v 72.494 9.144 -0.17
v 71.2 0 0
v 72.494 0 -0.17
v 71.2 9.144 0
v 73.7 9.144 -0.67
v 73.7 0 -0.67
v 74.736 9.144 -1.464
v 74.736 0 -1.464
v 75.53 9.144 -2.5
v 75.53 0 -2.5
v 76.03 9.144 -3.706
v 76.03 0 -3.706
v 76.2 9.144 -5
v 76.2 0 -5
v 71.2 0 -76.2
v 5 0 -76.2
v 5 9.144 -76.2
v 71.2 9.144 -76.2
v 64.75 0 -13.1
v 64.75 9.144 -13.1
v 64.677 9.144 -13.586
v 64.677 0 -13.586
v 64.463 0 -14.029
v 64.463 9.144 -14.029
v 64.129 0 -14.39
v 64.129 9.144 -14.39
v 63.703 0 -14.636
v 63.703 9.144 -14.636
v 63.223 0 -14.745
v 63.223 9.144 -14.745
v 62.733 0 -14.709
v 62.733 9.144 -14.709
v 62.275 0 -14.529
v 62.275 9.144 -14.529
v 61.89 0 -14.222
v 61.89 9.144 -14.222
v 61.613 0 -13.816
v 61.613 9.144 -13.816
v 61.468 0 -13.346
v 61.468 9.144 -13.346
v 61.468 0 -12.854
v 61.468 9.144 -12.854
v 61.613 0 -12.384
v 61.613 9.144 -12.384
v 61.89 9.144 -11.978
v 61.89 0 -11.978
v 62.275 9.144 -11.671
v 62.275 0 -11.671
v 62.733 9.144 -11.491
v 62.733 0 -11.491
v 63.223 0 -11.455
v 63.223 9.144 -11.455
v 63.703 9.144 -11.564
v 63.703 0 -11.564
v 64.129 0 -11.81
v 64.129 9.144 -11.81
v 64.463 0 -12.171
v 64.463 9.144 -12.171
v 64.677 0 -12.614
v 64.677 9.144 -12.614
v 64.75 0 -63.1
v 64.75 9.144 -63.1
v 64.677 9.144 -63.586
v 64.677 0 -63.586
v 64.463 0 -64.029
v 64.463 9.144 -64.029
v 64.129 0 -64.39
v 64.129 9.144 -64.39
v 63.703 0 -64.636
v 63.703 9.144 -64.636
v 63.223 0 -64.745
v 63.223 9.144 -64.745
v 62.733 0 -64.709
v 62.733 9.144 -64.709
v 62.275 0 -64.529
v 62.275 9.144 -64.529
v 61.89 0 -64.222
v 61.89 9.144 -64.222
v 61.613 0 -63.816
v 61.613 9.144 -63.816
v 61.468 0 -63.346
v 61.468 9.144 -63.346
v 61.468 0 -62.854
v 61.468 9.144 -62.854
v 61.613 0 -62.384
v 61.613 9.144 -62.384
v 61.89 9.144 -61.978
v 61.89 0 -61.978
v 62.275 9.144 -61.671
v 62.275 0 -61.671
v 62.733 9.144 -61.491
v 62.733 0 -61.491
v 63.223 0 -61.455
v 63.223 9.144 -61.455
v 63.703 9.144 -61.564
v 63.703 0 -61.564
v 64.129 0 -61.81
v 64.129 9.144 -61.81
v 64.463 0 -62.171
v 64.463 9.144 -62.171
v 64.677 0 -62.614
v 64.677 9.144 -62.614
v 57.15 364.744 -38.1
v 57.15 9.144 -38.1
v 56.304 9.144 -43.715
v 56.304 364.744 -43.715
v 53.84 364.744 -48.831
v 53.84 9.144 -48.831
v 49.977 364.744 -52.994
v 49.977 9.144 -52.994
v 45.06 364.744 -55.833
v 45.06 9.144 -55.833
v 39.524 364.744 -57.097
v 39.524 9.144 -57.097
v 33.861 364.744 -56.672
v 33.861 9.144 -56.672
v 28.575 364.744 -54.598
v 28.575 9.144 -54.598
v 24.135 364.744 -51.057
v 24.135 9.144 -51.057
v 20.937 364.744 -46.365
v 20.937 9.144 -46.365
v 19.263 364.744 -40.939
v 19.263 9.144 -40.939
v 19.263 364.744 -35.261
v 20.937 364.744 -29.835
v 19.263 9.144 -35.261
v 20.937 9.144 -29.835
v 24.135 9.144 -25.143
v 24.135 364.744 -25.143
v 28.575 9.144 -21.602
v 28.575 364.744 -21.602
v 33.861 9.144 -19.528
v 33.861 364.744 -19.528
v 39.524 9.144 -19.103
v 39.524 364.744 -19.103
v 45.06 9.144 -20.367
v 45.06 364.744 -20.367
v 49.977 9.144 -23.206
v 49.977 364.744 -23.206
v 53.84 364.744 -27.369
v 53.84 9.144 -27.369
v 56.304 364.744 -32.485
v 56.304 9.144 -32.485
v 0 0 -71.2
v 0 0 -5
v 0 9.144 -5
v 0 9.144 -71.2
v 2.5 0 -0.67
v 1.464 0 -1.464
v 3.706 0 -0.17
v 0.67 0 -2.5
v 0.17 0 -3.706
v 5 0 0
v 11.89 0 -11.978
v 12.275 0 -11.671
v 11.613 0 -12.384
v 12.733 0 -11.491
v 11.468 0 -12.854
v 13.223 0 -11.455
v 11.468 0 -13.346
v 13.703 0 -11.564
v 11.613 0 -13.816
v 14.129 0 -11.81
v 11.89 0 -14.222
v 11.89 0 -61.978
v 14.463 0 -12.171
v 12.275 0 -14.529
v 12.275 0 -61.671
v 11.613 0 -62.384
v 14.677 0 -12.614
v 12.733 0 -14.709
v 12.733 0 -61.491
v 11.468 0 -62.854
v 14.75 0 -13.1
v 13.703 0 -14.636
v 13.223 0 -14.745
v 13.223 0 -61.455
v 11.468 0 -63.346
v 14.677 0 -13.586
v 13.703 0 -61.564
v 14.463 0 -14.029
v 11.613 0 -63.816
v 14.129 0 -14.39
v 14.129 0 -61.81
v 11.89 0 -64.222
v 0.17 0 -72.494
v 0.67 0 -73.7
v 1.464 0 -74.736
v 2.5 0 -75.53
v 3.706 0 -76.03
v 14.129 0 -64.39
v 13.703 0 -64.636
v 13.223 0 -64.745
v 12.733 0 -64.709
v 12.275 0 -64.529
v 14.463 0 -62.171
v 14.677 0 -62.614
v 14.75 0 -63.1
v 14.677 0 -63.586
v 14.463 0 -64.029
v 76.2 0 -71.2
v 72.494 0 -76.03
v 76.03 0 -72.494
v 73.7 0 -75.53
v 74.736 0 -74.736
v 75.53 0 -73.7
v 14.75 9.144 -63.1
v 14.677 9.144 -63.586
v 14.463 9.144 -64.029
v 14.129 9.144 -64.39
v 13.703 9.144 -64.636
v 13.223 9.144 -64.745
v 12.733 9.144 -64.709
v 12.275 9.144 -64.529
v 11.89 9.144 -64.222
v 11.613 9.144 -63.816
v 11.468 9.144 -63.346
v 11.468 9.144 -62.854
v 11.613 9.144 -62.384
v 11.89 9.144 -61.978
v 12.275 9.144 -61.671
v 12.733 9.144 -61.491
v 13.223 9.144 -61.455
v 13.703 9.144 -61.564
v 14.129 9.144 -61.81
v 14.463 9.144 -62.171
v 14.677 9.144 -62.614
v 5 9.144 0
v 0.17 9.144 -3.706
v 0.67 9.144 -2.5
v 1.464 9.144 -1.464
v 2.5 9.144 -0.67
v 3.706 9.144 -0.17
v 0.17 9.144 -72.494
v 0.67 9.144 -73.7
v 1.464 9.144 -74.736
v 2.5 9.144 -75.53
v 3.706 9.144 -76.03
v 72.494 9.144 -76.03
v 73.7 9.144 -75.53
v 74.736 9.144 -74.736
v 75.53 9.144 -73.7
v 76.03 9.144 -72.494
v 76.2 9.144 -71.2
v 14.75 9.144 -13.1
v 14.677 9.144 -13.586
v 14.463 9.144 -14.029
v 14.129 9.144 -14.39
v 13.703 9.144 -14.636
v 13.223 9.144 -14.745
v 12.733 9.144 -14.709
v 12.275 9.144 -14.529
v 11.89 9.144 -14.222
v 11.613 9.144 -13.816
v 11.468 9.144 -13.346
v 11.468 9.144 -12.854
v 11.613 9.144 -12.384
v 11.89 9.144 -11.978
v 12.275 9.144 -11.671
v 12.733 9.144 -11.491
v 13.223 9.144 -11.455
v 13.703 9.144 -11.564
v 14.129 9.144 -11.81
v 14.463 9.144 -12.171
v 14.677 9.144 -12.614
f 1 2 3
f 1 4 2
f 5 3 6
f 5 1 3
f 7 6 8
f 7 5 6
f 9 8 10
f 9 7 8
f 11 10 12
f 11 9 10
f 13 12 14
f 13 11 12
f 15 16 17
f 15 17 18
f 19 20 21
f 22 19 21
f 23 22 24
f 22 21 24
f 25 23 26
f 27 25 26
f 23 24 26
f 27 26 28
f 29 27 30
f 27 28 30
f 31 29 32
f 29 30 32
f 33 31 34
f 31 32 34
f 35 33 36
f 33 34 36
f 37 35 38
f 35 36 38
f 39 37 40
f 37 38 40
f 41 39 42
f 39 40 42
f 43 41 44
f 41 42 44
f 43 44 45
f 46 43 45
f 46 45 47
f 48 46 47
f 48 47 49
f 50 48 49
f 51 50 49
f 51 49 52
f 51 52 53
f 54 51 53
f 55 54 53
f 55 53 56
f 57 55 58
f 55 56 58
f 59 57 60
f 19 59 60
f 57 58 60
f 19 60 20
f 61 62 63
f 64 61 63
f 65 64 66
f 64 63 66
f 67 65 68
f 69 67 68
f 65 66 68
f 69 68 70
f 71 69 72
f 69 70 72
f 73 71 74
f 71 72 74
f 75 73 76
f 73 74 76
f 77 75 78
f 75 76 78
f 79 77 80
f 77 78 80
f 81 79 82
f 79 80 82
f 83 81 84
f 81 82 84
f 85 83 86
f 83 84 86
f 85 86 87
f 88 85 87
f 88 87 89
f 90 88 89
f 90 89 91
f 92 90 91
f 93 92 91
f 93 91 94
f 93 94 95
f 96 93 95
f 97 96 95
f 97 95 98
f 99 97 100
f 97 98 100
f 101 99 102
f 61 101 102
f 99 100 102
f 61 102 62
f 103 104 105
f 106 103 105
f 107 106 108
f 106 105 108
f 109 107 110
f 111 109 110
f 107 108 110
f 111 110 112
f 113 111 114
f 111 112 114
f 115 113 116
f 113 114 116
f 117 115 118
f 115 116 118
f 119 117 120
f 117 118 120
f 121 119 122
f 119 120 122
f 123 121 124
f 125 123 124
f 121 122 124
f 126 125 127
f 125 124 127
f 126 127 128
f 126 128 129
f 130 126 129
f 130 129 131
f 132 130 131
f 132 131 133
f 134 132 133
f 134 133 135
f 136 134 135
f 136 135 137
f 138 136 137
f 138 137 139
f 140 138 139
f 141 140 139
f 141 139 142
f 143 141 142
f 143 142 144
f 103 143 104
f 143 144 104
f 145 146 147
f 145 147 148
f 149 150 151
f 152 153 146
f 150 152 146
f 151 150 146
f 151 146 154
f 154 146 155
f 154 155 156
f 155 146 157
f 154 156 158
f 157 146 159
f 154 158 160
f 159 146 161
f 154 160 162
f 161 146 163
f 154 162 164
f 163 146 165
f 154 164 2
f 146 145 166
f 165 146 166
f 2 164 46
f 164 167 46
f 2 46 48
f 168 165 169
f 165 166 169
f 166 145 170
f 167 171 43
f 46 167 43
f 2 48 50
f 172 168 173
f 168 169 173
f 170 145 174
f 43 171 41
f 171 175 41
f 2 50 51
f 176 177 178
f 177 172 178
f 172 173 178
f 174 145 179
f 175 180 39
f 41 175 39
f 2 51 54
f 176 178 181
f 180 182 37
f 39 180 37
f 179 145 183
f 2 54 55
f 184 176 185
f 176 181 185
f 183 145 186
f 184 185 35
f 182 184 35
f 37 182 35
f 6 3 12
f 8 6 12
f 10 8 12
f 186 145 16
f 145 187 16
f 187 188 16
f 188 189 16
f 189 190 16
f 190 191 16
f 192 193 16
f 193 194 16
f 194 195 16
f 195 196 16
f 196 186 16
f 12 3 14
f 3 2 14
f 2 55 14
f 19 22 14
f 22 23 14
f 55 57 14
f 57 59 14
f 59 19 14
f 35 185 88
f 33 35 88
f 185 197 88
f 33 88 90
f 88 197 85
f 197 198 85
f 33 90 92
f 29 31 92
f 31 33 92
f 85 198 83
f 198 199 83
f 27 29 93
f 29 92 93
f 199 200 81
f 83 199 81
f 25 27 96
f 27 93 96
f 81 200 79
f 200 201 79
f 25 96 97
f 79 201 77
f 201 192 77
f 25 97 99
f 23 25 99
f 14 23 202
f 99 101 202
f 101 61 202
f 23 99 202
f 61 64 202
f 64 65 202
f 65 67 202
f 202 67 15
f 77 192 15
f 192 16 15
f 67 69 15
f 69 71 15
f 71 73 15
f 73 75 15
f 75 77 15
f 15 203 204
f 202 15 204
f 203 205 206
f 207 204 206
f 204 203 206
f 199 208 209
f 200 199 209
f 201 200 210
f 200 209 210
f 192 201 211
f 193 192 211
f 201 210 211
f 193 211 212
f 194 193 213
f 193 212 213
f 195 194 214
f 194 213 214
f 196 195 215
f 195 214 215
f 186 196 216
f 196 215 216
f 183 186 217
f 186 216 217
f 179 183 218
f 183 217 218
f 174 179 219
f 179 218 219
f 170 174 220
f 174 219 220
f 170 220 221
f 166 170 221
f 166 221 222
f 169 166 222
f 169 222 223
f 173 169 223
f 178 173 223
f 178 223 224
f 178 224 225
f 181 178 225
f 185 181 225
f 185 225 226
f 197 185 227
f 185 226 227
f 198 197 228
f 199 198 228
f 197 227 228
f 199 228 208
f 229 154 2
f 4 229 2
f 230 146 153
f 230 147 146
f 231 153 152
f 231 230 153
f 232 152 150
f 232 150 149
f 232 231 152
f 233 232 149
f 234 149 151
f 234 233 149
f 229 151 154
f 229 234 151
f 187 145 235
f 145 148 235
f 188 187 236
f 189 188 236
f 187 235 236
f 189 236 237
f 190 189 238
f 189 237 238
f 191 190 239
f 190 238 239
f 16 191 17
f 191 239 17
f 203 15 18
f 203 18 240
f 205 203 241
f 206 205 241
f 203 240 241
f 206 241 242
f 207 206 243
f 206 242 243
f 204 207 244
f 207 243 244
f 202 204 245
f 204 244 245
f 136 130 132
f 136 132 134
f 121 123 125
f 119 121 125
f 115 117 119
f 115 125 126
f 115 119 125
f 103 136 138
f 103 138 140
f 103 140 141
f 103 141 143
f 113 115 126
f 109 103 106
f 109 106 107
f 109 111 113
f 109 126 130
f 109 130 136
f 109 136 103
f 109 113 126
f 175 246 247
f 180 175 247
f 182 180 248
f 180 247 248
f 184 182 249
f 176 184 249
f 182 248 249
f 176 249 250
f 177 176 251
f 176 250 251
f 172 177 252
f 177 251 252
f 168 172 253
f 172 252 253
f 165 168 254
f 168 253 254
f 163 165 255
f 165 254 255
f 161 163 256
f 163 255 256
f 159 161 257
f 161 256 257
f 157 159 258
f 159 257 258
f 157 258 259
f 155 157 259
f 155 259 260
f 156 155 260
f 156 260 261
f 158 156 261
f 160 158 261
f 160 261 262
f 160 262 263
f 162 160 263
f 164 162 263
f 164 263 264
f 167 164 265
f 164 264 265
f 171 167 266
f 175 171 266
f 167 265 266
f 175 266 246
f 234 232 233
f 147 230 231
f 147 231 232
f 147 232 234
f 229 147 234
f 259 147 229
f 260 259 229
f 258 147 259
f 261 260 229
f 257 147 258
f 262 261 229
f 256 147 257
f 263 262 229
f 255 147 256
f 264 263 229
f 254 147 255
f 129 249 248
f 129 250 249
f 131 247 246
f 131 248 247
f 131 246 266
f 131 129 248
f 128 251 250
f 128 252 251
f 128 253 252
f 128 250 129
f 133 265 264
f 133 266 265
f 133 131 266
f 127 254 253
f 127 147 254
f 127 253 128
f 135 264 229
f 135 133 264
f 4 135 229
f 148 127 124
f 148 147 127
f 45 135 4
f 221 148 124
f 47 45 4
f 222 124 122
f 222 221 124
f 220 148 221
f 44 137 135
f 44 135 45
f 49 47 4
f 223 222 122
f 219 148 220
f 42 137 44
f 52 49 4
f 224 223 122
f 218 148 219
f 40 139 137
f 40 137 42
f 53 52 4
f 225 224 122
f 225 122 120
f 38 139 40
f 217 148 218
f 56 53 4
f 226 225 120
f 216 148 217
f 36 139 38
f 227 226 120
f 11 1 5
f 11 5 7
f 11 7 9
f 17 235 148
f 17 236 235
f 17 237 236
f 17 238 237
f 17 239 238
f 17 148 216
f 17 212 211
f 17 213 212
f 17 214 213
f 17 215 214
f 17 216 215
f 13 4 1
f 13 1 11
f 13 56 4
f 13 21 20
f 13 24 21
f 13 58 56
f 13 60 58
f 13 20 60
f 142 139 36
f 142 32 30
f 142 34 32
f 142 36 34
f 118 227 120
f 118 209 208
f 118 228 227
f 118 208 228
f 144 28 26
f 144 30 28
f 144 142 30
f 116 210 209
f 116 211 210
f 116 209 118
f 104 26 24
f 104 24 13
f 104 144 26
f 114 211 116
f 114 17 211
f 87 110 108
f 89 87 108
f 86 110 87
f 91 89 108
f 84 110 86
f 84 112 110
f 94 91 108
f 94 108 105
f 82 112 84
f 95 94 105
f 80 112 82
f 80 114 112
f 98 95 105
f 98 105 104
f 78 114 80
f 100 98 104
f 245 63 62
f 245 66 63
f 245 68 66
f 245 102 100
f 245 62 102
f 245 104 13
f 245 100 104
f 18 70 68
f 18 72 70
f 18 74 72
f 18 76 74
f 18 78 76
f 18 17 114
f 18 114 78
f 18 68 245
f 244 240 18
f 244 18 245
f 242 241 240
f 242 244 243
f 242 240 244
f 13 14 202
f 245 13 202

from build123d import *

# Parameters (mm, degrees)
SKETCH1_W           = 76.2
SKETCH1_H           = 76.2
BOSS_EXTRUDE1_DEPTH = 9.144
SKETCH2_R           = 1.65
CUT_EXTRUDE1_DEPTH  = 9.144
SKETCH3_R           = 19.05
BOSS_EXTRUDE2_DEPTH = 355.6
FILLET1_R           = 5


with BuildPart() as part:
    # Sketch1 → Boss-Extrude1 (new body)
    with BuildSketch(Plane(origin=(0, 0, 0), x_dir=(1, 0, 0), z_dir=(0, 1, 0))):
        with Locations((38.1, 38.1)):
            Rectangle(SKETCH1_W, SKETCH1_H)
    extrude(amount=BOSS_EXTRUDE1_DEPTH)

    # Sketch2 → Cut-Extrude1 (cut)
    with BuildSketch(Plane(origin=(0, 9.144, 0), x_dir=(1, 0, 0), z_dir=(0, 1, 0))):
        with Locations((13.1, 63.1)):
            Circle(SKETCH2_R)
        with Locations((63.1, 63.1)):
            Circle(SKETCH2_R)
        with Locations((63.1, 13.1)):
            Circle(SKETCH2_R)
        with Locations((13.1, 13.1)):
            Circle(SKETCH2_R)
    extrude(amount=-CUT_EXTRUDE1_DEPTH, mode=Mode.SUBTRACT)

    # Sketch3 → Boss-Extrude2 (add)
    with BuildSketch(Plane(origin=(0, 9.144, 0), x_dir=(1, 0, 0), z_dir=(0, 1, 0))):
        with Locations((38.1, 38.1)):
            Circle(SKETCH3_R)
    extrude(amount=BOSS_EXTRUDE2_DEPTH)

    # Fillet1
    fillet1_edges = [part.edges().sort_by_distance(p)[0] for p in [
        (0, 4.572, -76.2),
        (76.2, 4.572, -76.2),
        (76.2, 4.572, 0),
        (0, 4.572, 0),
    ]]
    fillet(fillet1_edges, radius=FILLET1_R)


solid = part.part
